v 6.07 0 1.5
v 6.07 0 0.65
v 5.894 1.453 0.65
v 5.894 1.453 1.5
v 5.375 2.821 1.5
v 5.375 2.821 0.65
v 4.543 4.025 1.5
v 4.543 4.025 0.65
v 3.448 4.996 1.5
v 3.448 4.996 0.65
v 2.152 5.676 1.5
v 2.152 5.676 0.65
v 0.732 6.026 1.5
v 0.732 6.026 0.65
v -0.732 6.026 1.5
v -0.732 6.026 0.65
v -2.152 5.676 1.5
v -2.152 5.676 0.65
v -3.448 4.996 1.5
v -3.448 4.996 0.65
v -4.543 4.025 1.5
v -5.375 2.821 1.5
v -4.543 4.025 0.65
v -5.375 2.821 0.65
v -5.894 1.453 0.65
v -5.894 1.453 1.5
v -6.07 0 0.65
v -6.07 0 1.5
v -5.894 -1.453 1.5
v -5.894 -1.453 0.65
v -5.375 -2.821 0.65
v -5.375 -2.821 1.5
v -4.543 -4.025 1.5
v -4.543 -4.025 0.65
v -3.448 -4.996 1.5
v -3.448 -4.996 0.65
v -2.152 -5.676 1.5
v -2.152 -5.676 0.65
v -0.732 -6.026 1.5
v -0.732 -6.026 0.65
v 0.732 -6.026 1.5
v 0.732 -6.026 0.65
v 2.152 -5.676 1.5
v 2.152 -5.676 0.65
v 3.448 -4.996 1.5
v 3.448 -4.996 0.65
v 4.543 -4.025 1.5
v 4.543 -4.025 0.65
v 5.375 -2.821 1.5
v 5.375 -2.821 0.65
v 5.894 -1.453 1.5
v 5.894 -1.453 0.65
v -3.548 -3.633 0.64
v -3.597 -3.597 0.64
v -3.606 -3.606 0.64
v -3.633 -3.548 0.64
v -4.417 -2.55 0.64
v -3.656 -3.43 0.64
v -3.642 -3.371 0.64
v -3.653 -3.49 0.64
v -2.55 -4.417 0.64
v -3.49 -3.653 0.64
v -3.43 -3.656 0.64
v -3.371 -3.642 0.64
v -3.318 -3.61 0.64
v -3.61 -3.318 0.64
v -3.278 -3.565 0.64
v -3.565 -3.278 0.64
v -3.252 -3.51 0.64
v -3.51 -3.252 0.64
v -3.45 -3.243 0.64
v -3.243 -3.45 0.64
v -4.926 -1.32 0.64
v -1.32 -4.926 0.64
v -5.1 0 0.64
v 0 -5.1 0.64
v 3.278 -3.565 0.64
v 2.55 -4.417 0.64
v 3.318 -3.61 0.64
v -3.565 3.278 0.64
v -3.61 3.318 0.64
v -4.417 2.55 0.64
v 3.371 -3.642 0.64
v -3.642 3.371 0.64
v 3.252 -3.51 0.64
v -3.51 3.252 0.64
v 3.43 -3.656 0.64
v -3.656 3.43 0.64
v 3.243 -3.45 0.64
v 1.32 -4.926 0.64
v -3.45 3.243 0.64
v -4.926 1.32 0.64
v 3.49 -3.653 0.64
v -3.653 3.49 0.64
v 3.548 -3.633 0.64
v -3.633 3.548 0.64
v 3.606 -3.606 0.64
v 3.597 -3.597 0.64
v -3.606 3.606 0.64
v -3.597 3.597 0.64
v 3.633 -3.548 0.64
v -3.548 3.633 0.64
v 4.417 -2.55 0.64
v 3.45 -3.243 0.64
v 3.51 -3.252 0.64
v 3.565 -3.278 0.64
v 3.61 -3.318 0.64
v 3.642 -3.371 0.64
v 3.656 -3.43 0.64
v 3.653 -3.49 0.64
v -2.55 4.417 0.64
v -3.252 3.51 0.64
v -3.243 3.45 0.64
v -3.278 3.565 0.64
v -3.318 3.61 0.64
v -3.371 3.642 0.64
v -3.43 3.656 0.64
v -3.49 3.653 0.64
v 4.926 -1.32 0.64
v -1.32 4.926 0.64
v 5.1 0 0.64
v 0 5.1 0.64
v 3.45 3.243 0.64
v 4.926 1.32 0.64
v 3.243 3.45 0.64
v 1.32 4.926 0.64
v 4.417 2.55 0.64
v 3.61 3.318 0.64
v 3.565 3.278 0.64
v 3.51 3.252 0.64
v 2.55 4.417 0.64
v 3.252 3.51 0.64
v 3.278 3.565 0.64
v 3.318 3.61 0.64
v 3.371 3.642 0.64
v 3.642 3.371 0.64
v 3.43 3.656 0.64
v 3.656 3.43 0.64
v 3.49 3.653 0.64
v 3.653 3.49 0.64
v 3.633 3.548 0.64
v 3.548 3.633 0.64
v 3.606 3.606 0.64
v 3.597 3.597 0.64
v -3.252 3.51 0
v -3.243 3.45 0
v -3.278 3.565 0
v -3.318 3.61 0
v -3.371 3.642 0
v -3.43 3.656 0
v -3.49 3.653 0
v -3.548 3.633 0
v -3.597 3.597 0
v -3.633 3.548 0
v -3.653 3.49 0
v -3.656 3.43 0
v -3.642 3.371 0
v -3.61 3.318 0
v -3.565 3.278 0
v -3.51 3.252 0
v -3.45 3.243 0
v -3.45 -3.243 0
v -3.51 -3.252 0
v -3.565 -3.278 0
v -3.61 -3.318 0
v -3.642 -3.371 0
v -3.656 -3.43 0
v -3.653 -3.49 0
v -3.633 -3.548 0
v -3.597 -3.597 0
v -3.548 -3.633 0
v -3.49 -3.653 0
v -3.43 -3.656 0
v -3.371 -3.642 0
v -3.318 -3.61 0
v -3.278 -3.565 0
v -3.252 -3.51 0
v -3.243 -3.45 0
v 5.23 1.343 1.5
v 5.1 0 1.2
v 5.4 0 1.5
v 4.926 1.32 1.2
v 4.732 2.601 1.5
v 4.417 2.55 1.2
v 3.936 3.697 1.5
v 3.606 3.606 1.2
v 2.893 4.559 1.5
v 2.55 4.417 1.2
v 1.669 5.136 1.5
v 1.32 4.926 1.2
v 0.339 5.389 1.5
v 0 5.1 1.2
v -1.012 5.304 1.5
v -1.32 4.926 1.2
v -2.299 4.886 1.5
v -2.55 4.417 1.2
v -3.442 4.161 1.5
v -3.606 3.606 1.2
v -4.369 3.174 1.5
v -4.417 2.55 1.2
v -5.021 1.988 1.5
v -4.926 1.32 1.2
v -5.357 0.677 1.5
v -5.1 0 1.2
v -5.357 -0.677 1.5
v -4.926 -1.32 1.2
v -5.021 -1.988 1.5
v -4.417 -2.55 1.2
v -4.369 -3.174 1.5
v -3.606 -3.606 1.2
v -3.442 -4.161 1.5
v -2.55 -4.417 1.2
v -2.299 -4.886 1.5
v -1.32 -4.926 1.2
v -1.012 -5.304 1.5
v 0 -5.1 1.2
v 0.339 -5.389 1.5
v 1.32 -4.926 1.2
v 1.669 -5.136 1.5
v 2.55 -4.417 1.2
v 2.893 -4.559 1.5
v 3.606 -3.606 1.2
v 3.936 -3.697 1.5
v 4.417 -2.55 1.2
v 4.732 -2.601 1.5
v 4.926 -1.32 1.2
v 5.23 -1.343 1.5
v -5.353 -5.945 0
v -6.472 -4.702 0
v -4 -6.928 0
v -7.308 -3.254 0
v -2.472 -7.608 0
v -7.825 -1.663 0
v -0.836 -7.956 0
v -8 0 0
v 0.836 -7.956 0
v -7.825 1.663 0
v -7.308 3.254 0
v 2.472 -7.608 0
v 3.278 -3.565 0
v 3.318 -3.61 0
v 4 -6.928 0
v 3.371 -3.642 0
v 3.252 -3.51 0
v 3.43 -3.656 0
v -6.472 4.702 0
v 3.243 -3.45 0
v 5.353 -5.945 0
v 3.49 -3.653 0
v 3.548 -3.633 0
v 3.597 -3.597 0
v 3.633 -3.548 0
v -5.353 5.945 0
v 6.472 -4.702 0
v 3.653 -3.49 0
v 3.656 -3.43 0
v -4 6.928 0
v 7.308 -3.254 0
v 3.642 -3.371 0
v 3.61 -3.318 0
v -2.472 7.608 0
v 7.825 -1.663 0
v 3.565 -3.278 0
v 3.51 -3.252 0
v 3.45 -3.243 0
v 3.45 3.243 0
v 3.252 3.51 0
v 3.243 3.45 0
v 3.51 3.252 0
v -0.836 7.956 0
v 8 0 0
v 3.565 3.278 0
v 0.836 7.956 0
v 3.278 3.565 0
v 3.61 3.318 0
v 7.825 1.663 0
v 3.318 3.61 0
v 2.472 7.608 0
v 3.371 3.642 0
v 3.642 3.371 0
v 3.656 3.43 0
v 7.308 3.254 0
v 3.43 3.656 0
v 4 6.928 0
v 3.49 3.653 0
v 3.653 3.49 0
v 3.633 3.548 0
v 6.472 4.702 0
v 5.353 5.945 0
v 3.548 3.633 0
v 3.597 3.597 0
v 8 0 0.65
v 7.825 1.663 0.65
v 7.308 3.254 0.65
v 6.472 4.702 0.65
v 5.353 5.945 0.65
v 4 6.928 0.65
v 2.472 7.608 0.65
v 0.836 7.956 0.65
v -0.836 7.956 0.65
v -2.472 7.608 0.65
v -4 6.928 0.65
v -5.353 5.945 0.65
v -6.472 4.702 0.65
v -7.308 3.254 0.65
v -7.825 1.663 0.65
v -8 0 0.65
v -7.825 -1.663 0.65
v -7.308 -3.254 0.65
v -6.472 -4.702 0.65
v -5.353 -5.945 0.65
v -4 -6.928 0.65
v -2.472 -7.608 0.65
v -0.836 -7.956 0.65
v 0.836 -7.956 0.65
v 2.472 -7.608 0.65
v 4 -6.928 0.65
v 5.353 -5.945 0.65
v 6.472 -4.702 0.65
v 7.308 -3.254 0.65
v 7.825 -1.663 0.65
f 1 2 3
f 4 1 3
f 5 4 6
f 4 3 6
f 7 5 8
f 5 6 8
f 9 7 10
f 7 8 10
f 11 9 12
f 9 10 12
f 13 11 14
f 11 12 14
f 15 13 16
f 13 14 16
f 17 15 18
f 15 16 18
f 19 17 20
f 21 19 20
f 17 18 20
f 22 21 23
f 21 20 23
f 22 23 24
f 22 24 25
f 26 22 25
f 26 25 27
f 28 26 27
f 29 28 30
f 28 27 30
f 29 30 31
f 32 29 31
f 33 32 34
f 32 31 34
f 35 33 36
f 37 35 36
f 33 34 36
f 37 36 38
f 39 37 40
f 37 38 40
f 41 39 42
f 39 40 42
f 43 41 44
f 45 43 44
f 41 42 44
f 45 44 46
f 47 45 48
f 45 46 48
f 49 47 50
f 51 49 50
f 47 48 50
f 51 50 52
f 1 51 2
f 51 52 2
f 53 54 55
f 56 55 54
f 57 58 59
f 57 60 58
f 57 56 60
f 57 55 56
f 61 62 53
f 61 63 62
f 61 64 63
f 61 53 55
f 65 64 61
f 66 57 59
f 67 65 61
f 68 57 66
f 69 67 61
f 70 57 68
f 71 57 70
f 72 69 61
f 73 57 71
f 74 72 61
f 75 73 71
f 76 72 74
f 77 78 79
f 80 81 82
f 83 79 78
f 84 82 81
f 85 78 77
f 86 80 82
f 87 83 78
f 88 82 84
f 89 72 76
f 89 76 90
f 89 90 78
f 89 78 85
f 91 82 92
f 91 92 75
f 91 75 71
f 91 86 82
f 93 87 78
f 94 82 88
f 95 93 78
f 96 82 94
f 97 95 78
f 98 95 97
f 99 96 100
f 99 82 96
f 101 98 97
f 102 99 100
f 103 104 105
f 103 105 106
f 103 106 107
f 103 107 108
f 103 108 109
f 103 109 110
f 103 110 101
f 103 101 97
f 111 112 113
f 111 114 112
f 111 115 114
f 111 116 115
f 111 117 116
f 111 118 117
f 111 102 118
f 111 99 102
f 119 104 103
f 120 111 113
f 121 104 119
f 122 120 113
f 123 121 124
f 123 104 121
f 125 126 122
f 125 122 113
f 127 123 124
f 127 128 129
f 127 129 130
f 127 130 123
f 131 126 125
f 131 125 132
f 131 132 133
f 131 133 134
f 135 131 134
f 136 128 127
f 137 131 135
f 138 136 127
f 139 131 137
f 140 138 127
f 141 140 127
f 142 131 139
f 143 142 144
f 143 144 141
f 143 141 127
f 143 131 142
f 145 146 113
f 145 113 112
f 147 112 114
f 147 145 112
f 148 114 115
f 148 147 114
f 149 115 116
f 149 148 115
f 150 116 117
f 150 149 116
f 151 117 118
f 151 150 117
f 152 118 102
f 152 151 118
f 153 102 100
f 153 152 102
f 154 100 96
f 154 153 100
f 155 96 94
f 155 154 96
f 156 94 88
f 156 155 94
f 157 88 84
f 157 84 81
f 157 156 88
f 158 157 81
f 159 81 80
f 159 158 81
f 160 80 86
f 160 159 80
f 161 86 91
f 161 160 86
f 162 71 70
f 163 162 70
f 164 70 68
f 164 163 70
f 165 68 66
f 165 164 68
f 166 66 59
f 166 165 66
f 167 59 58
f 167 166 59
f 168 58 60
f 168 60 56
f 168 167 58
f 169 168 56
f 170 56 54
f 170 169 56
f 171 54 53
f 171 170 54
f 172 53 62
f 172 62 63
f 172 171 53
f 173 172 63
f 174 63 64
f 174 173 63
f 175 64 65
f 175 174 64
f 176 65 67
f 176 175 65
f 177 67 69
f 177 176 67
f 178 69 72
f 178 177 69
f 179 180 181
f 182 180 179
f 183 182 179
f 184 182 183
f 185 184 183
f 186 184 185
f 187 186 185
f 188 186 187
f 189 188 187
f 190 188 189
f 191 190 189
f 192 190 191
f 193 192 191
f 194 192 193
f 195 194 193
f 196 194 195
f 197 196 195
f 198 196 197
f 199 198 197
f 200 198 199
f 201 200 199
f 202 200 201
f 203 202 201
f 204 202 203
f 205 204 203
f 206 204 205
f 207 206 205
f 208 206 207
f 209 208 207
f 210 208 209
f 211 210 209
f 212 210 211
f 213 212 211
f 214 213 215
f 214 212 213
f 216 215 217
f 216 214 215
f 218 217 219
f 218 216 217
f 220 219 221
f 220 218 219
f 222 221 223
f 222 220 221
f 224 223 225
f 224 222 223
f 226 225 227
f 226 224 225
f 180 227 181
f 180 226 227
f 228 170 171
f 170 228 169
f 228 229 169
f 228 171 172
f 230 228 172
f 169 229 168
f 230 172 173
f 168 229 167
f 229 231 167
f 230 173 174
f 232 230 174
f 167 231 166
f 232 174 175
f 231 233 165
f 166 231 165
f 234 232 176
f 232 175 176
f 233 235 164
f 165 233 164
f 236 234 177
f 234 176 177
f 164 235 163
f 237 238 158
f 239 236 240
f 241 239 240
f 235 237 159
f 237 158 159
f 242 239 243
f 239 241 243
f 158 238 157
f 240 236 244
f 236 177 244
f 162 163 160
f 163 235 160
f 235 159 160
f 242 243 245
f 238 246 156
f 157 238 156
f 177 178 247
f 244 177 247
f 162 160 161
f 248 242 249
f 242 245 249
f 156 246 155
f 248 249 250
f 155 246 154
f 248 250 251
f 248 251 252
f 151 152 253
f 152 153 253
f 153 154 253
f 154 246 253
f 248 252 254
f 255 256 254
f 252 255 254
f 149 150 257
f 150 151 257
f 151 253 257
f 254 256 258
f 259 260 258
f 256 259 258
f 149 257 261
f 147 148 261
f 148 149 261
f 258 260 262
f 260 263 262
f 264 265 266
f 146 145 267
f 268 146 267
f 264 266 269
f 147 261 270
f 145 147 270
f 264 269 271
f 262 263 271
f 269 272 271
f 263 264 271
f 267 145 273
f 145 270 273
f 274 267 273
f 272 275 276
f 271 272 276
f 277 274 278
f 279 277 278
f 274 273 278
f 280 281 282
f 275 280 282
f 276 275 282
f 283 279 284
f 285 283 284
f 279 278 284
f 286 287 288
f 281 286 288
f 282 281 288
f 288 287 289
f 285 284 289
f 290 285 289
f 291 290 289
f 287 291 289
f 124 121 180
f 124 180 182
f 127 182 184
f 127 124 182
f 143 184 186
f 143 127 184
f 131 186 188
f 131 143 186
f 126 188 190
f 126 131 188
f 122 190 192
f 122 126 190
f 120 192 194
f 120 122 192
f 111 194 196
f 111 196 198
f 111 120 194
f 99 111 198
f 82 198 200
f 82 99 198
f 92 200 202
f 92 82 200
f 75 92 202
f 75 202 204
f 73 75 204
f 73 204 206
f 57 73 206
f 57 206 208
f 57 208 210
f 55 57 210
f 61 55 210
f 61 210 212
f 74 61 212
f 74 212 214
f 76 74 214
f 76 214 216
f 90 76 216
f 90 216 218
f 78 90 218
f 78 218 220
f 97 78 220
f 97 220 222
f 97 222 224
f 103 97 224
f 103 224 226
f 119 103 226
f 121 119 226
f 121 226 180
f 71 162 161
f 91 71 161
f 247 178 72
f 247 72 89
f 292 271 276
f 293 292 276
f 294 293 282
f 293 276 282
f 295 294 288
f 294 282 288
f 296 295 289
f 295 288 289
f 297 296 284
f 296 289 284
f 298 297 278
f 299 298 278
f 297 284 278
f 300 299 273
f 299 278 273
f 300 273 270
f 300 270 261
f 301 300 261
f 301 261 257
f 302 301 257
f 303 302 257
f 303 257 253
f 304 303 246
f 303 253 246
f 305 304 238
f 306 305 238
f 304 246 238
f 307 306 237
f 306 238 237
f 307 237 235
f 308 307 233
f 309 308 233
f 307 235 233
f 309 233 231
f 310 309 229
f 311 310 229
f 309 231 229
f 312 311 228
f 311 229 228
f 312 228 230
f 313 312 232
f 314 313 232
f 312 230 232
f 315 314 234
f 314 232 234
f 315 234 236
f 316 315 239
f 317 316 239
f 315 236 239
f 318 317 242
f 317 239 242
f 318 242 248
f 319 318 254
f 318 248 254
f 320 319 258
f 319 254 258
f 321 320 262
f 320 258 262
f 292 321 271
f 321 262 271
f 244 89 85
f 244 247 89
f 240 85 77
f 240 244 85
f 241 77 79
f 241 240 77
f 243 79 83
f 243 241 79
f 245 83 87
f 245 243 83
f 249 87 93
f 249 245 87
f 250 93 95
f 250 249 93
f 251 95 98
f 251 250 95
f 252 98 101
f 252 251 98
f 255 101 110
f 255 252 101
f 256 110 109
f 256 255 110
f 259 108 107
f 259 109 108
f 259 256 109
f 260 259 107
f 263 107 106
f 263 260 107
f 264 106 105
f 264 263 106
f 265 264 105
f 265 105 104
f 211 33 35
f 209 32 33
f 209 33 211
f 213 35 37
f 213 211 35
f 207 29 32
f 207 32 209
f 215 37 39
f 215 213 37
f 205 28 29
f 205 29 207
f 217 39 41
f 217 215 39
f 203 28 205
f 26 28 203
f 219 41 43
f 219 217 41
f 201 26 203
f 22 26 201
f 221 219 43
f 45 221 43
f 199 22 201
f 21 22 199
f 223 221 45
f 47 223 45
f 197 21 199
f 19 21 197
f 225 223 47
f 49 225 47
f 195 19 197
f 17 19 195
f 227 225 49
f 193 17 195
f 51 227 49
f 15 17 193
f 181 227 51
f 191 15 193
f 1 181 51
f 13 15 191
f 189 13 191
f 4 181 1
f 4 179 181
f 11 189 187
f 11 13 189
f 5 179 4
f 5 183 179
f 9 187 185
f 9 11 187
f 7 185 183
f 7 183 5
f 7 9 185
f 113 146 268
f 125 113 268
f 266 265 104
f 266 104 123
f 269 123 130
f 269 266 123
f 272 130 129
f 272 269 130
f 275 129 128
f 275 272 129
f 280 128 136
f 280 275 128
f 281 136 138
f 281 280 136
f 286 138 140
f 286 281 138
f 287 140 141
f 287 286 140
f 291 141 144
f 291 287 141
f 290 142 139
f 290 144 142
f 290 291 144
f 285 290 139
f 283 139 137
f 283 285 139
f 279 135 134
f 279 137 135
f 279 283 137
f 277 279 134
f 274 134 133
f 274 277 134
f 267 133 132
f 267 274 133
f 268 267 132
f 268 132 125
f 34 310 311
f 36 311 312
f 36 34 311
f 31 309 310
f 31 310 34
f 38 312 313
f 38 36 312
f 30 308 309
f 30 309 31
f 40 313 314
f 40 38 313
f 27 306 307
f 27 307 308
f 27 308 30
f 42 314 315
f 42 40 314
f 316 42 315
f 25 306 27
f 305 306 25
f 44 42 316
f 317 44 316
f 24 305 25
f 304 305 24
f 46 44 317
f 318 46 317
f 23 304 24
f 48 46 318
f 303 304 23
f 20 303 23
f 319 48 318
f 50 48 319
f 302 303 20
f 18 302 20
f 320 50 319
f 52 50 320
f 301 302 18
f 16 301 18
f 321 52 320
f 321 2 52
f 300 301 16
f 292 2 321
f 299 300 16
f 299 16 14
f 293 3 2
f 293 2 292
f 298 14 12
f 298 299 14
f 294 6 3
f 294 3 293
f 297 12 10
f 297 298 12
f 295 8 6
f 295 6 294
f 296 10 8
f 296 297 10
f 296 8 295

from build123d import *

# Parameters (mm, degrees)
SKETCH_1_R          = 8
EXTRUDE_1_DEPTH     = 0.65
EXTRUDE_START       = 0.65
SKETCH_2_R          = 6.07
SKETCH_2_R_2        = 5.1
EXTRUDE_2_DEPTH     = 0.85
CUT_EXTRUDE_START   = 0.65
SKETCH_3_R          = 5.1
CUT_EXTRUDE_1_DEPTH = 0.01
SKETCH_4_W          = 6.9
SKETCH_4_H          = 6.9
CUT_EXTRUDE_2_DEPTH = 0.64
CHAMFER_1_SIZE      = 0.3
SKETCH_6_R          = 0.207363545
CUT_EXTRUDE_3_DEPTH = 0.64


with BuildPart() as part:
    # 草图1 → 凸台-拉伸1 (new body)
    with BuildSketch(Plane.XY):
        Circle(SKETCH_1_R)
    extrude(amount=EXTRUDE_1_DEPTH)

    # 草图2 → 凸台-拉伸2 (add)
    with BuildSketch(Plane.XY.offset(EXTRUDE_START)):
        Circle(SKETCH_2_R)
        Circle(SKETCH_2_R_2, mode=Mode.SUBTRACT)
    extrude(amount=EXTRUDE_2_DEPTH)

    # 草图3 → 切除-拉伸1 (cut)
    with BuildSketch(Plane.XY.offset(CUT_EXTRUDE_START)):
        Circle(SKETCH_3_R)
    extrude(amount=-CUT_EXTRUDE_1_DEPTH, mode=Mode.SUBTRACT)

    # 草图4 → 切除-拉伸2 (cut)
    with BuildSketch(Plane.XY):
        Rectangle(SKETCH_4_W, SKETCH_4_H)
    extrude(amount=CUT_EXTRUDE_2_DEPTH, mode=Mode.SUBTRACT)

    # 倒角1
    chamfer_1_edges = [part.edges().sort_by_distance(p)[0] for p in [
        (-5.1, 0, 1.5),
    ]]
    chamfer(chamfer_1_edges, length=CHAMFER_1_SIZE)

    # 草图6 → 切除-拉伸3 (cut)
    with BuildSketch(Plane.XY):
        with Locations((-3.45, 3.45)):
            Circle(SKETCH_6_R)
        with Locations((3.45, 3.45)):
            Circle(SKETCH_6_R)
        with Locations((3.45, -3.45)):
            Circle(SKETCH_6_R)
        with Locations((-3.45, -3.45)):
            Circle(SKETCH_6_R)
    extrude(amount=CUT_EXTRUDE_3_DEPTH, mode=Mode.SUBTRACT)


solid = part.part
